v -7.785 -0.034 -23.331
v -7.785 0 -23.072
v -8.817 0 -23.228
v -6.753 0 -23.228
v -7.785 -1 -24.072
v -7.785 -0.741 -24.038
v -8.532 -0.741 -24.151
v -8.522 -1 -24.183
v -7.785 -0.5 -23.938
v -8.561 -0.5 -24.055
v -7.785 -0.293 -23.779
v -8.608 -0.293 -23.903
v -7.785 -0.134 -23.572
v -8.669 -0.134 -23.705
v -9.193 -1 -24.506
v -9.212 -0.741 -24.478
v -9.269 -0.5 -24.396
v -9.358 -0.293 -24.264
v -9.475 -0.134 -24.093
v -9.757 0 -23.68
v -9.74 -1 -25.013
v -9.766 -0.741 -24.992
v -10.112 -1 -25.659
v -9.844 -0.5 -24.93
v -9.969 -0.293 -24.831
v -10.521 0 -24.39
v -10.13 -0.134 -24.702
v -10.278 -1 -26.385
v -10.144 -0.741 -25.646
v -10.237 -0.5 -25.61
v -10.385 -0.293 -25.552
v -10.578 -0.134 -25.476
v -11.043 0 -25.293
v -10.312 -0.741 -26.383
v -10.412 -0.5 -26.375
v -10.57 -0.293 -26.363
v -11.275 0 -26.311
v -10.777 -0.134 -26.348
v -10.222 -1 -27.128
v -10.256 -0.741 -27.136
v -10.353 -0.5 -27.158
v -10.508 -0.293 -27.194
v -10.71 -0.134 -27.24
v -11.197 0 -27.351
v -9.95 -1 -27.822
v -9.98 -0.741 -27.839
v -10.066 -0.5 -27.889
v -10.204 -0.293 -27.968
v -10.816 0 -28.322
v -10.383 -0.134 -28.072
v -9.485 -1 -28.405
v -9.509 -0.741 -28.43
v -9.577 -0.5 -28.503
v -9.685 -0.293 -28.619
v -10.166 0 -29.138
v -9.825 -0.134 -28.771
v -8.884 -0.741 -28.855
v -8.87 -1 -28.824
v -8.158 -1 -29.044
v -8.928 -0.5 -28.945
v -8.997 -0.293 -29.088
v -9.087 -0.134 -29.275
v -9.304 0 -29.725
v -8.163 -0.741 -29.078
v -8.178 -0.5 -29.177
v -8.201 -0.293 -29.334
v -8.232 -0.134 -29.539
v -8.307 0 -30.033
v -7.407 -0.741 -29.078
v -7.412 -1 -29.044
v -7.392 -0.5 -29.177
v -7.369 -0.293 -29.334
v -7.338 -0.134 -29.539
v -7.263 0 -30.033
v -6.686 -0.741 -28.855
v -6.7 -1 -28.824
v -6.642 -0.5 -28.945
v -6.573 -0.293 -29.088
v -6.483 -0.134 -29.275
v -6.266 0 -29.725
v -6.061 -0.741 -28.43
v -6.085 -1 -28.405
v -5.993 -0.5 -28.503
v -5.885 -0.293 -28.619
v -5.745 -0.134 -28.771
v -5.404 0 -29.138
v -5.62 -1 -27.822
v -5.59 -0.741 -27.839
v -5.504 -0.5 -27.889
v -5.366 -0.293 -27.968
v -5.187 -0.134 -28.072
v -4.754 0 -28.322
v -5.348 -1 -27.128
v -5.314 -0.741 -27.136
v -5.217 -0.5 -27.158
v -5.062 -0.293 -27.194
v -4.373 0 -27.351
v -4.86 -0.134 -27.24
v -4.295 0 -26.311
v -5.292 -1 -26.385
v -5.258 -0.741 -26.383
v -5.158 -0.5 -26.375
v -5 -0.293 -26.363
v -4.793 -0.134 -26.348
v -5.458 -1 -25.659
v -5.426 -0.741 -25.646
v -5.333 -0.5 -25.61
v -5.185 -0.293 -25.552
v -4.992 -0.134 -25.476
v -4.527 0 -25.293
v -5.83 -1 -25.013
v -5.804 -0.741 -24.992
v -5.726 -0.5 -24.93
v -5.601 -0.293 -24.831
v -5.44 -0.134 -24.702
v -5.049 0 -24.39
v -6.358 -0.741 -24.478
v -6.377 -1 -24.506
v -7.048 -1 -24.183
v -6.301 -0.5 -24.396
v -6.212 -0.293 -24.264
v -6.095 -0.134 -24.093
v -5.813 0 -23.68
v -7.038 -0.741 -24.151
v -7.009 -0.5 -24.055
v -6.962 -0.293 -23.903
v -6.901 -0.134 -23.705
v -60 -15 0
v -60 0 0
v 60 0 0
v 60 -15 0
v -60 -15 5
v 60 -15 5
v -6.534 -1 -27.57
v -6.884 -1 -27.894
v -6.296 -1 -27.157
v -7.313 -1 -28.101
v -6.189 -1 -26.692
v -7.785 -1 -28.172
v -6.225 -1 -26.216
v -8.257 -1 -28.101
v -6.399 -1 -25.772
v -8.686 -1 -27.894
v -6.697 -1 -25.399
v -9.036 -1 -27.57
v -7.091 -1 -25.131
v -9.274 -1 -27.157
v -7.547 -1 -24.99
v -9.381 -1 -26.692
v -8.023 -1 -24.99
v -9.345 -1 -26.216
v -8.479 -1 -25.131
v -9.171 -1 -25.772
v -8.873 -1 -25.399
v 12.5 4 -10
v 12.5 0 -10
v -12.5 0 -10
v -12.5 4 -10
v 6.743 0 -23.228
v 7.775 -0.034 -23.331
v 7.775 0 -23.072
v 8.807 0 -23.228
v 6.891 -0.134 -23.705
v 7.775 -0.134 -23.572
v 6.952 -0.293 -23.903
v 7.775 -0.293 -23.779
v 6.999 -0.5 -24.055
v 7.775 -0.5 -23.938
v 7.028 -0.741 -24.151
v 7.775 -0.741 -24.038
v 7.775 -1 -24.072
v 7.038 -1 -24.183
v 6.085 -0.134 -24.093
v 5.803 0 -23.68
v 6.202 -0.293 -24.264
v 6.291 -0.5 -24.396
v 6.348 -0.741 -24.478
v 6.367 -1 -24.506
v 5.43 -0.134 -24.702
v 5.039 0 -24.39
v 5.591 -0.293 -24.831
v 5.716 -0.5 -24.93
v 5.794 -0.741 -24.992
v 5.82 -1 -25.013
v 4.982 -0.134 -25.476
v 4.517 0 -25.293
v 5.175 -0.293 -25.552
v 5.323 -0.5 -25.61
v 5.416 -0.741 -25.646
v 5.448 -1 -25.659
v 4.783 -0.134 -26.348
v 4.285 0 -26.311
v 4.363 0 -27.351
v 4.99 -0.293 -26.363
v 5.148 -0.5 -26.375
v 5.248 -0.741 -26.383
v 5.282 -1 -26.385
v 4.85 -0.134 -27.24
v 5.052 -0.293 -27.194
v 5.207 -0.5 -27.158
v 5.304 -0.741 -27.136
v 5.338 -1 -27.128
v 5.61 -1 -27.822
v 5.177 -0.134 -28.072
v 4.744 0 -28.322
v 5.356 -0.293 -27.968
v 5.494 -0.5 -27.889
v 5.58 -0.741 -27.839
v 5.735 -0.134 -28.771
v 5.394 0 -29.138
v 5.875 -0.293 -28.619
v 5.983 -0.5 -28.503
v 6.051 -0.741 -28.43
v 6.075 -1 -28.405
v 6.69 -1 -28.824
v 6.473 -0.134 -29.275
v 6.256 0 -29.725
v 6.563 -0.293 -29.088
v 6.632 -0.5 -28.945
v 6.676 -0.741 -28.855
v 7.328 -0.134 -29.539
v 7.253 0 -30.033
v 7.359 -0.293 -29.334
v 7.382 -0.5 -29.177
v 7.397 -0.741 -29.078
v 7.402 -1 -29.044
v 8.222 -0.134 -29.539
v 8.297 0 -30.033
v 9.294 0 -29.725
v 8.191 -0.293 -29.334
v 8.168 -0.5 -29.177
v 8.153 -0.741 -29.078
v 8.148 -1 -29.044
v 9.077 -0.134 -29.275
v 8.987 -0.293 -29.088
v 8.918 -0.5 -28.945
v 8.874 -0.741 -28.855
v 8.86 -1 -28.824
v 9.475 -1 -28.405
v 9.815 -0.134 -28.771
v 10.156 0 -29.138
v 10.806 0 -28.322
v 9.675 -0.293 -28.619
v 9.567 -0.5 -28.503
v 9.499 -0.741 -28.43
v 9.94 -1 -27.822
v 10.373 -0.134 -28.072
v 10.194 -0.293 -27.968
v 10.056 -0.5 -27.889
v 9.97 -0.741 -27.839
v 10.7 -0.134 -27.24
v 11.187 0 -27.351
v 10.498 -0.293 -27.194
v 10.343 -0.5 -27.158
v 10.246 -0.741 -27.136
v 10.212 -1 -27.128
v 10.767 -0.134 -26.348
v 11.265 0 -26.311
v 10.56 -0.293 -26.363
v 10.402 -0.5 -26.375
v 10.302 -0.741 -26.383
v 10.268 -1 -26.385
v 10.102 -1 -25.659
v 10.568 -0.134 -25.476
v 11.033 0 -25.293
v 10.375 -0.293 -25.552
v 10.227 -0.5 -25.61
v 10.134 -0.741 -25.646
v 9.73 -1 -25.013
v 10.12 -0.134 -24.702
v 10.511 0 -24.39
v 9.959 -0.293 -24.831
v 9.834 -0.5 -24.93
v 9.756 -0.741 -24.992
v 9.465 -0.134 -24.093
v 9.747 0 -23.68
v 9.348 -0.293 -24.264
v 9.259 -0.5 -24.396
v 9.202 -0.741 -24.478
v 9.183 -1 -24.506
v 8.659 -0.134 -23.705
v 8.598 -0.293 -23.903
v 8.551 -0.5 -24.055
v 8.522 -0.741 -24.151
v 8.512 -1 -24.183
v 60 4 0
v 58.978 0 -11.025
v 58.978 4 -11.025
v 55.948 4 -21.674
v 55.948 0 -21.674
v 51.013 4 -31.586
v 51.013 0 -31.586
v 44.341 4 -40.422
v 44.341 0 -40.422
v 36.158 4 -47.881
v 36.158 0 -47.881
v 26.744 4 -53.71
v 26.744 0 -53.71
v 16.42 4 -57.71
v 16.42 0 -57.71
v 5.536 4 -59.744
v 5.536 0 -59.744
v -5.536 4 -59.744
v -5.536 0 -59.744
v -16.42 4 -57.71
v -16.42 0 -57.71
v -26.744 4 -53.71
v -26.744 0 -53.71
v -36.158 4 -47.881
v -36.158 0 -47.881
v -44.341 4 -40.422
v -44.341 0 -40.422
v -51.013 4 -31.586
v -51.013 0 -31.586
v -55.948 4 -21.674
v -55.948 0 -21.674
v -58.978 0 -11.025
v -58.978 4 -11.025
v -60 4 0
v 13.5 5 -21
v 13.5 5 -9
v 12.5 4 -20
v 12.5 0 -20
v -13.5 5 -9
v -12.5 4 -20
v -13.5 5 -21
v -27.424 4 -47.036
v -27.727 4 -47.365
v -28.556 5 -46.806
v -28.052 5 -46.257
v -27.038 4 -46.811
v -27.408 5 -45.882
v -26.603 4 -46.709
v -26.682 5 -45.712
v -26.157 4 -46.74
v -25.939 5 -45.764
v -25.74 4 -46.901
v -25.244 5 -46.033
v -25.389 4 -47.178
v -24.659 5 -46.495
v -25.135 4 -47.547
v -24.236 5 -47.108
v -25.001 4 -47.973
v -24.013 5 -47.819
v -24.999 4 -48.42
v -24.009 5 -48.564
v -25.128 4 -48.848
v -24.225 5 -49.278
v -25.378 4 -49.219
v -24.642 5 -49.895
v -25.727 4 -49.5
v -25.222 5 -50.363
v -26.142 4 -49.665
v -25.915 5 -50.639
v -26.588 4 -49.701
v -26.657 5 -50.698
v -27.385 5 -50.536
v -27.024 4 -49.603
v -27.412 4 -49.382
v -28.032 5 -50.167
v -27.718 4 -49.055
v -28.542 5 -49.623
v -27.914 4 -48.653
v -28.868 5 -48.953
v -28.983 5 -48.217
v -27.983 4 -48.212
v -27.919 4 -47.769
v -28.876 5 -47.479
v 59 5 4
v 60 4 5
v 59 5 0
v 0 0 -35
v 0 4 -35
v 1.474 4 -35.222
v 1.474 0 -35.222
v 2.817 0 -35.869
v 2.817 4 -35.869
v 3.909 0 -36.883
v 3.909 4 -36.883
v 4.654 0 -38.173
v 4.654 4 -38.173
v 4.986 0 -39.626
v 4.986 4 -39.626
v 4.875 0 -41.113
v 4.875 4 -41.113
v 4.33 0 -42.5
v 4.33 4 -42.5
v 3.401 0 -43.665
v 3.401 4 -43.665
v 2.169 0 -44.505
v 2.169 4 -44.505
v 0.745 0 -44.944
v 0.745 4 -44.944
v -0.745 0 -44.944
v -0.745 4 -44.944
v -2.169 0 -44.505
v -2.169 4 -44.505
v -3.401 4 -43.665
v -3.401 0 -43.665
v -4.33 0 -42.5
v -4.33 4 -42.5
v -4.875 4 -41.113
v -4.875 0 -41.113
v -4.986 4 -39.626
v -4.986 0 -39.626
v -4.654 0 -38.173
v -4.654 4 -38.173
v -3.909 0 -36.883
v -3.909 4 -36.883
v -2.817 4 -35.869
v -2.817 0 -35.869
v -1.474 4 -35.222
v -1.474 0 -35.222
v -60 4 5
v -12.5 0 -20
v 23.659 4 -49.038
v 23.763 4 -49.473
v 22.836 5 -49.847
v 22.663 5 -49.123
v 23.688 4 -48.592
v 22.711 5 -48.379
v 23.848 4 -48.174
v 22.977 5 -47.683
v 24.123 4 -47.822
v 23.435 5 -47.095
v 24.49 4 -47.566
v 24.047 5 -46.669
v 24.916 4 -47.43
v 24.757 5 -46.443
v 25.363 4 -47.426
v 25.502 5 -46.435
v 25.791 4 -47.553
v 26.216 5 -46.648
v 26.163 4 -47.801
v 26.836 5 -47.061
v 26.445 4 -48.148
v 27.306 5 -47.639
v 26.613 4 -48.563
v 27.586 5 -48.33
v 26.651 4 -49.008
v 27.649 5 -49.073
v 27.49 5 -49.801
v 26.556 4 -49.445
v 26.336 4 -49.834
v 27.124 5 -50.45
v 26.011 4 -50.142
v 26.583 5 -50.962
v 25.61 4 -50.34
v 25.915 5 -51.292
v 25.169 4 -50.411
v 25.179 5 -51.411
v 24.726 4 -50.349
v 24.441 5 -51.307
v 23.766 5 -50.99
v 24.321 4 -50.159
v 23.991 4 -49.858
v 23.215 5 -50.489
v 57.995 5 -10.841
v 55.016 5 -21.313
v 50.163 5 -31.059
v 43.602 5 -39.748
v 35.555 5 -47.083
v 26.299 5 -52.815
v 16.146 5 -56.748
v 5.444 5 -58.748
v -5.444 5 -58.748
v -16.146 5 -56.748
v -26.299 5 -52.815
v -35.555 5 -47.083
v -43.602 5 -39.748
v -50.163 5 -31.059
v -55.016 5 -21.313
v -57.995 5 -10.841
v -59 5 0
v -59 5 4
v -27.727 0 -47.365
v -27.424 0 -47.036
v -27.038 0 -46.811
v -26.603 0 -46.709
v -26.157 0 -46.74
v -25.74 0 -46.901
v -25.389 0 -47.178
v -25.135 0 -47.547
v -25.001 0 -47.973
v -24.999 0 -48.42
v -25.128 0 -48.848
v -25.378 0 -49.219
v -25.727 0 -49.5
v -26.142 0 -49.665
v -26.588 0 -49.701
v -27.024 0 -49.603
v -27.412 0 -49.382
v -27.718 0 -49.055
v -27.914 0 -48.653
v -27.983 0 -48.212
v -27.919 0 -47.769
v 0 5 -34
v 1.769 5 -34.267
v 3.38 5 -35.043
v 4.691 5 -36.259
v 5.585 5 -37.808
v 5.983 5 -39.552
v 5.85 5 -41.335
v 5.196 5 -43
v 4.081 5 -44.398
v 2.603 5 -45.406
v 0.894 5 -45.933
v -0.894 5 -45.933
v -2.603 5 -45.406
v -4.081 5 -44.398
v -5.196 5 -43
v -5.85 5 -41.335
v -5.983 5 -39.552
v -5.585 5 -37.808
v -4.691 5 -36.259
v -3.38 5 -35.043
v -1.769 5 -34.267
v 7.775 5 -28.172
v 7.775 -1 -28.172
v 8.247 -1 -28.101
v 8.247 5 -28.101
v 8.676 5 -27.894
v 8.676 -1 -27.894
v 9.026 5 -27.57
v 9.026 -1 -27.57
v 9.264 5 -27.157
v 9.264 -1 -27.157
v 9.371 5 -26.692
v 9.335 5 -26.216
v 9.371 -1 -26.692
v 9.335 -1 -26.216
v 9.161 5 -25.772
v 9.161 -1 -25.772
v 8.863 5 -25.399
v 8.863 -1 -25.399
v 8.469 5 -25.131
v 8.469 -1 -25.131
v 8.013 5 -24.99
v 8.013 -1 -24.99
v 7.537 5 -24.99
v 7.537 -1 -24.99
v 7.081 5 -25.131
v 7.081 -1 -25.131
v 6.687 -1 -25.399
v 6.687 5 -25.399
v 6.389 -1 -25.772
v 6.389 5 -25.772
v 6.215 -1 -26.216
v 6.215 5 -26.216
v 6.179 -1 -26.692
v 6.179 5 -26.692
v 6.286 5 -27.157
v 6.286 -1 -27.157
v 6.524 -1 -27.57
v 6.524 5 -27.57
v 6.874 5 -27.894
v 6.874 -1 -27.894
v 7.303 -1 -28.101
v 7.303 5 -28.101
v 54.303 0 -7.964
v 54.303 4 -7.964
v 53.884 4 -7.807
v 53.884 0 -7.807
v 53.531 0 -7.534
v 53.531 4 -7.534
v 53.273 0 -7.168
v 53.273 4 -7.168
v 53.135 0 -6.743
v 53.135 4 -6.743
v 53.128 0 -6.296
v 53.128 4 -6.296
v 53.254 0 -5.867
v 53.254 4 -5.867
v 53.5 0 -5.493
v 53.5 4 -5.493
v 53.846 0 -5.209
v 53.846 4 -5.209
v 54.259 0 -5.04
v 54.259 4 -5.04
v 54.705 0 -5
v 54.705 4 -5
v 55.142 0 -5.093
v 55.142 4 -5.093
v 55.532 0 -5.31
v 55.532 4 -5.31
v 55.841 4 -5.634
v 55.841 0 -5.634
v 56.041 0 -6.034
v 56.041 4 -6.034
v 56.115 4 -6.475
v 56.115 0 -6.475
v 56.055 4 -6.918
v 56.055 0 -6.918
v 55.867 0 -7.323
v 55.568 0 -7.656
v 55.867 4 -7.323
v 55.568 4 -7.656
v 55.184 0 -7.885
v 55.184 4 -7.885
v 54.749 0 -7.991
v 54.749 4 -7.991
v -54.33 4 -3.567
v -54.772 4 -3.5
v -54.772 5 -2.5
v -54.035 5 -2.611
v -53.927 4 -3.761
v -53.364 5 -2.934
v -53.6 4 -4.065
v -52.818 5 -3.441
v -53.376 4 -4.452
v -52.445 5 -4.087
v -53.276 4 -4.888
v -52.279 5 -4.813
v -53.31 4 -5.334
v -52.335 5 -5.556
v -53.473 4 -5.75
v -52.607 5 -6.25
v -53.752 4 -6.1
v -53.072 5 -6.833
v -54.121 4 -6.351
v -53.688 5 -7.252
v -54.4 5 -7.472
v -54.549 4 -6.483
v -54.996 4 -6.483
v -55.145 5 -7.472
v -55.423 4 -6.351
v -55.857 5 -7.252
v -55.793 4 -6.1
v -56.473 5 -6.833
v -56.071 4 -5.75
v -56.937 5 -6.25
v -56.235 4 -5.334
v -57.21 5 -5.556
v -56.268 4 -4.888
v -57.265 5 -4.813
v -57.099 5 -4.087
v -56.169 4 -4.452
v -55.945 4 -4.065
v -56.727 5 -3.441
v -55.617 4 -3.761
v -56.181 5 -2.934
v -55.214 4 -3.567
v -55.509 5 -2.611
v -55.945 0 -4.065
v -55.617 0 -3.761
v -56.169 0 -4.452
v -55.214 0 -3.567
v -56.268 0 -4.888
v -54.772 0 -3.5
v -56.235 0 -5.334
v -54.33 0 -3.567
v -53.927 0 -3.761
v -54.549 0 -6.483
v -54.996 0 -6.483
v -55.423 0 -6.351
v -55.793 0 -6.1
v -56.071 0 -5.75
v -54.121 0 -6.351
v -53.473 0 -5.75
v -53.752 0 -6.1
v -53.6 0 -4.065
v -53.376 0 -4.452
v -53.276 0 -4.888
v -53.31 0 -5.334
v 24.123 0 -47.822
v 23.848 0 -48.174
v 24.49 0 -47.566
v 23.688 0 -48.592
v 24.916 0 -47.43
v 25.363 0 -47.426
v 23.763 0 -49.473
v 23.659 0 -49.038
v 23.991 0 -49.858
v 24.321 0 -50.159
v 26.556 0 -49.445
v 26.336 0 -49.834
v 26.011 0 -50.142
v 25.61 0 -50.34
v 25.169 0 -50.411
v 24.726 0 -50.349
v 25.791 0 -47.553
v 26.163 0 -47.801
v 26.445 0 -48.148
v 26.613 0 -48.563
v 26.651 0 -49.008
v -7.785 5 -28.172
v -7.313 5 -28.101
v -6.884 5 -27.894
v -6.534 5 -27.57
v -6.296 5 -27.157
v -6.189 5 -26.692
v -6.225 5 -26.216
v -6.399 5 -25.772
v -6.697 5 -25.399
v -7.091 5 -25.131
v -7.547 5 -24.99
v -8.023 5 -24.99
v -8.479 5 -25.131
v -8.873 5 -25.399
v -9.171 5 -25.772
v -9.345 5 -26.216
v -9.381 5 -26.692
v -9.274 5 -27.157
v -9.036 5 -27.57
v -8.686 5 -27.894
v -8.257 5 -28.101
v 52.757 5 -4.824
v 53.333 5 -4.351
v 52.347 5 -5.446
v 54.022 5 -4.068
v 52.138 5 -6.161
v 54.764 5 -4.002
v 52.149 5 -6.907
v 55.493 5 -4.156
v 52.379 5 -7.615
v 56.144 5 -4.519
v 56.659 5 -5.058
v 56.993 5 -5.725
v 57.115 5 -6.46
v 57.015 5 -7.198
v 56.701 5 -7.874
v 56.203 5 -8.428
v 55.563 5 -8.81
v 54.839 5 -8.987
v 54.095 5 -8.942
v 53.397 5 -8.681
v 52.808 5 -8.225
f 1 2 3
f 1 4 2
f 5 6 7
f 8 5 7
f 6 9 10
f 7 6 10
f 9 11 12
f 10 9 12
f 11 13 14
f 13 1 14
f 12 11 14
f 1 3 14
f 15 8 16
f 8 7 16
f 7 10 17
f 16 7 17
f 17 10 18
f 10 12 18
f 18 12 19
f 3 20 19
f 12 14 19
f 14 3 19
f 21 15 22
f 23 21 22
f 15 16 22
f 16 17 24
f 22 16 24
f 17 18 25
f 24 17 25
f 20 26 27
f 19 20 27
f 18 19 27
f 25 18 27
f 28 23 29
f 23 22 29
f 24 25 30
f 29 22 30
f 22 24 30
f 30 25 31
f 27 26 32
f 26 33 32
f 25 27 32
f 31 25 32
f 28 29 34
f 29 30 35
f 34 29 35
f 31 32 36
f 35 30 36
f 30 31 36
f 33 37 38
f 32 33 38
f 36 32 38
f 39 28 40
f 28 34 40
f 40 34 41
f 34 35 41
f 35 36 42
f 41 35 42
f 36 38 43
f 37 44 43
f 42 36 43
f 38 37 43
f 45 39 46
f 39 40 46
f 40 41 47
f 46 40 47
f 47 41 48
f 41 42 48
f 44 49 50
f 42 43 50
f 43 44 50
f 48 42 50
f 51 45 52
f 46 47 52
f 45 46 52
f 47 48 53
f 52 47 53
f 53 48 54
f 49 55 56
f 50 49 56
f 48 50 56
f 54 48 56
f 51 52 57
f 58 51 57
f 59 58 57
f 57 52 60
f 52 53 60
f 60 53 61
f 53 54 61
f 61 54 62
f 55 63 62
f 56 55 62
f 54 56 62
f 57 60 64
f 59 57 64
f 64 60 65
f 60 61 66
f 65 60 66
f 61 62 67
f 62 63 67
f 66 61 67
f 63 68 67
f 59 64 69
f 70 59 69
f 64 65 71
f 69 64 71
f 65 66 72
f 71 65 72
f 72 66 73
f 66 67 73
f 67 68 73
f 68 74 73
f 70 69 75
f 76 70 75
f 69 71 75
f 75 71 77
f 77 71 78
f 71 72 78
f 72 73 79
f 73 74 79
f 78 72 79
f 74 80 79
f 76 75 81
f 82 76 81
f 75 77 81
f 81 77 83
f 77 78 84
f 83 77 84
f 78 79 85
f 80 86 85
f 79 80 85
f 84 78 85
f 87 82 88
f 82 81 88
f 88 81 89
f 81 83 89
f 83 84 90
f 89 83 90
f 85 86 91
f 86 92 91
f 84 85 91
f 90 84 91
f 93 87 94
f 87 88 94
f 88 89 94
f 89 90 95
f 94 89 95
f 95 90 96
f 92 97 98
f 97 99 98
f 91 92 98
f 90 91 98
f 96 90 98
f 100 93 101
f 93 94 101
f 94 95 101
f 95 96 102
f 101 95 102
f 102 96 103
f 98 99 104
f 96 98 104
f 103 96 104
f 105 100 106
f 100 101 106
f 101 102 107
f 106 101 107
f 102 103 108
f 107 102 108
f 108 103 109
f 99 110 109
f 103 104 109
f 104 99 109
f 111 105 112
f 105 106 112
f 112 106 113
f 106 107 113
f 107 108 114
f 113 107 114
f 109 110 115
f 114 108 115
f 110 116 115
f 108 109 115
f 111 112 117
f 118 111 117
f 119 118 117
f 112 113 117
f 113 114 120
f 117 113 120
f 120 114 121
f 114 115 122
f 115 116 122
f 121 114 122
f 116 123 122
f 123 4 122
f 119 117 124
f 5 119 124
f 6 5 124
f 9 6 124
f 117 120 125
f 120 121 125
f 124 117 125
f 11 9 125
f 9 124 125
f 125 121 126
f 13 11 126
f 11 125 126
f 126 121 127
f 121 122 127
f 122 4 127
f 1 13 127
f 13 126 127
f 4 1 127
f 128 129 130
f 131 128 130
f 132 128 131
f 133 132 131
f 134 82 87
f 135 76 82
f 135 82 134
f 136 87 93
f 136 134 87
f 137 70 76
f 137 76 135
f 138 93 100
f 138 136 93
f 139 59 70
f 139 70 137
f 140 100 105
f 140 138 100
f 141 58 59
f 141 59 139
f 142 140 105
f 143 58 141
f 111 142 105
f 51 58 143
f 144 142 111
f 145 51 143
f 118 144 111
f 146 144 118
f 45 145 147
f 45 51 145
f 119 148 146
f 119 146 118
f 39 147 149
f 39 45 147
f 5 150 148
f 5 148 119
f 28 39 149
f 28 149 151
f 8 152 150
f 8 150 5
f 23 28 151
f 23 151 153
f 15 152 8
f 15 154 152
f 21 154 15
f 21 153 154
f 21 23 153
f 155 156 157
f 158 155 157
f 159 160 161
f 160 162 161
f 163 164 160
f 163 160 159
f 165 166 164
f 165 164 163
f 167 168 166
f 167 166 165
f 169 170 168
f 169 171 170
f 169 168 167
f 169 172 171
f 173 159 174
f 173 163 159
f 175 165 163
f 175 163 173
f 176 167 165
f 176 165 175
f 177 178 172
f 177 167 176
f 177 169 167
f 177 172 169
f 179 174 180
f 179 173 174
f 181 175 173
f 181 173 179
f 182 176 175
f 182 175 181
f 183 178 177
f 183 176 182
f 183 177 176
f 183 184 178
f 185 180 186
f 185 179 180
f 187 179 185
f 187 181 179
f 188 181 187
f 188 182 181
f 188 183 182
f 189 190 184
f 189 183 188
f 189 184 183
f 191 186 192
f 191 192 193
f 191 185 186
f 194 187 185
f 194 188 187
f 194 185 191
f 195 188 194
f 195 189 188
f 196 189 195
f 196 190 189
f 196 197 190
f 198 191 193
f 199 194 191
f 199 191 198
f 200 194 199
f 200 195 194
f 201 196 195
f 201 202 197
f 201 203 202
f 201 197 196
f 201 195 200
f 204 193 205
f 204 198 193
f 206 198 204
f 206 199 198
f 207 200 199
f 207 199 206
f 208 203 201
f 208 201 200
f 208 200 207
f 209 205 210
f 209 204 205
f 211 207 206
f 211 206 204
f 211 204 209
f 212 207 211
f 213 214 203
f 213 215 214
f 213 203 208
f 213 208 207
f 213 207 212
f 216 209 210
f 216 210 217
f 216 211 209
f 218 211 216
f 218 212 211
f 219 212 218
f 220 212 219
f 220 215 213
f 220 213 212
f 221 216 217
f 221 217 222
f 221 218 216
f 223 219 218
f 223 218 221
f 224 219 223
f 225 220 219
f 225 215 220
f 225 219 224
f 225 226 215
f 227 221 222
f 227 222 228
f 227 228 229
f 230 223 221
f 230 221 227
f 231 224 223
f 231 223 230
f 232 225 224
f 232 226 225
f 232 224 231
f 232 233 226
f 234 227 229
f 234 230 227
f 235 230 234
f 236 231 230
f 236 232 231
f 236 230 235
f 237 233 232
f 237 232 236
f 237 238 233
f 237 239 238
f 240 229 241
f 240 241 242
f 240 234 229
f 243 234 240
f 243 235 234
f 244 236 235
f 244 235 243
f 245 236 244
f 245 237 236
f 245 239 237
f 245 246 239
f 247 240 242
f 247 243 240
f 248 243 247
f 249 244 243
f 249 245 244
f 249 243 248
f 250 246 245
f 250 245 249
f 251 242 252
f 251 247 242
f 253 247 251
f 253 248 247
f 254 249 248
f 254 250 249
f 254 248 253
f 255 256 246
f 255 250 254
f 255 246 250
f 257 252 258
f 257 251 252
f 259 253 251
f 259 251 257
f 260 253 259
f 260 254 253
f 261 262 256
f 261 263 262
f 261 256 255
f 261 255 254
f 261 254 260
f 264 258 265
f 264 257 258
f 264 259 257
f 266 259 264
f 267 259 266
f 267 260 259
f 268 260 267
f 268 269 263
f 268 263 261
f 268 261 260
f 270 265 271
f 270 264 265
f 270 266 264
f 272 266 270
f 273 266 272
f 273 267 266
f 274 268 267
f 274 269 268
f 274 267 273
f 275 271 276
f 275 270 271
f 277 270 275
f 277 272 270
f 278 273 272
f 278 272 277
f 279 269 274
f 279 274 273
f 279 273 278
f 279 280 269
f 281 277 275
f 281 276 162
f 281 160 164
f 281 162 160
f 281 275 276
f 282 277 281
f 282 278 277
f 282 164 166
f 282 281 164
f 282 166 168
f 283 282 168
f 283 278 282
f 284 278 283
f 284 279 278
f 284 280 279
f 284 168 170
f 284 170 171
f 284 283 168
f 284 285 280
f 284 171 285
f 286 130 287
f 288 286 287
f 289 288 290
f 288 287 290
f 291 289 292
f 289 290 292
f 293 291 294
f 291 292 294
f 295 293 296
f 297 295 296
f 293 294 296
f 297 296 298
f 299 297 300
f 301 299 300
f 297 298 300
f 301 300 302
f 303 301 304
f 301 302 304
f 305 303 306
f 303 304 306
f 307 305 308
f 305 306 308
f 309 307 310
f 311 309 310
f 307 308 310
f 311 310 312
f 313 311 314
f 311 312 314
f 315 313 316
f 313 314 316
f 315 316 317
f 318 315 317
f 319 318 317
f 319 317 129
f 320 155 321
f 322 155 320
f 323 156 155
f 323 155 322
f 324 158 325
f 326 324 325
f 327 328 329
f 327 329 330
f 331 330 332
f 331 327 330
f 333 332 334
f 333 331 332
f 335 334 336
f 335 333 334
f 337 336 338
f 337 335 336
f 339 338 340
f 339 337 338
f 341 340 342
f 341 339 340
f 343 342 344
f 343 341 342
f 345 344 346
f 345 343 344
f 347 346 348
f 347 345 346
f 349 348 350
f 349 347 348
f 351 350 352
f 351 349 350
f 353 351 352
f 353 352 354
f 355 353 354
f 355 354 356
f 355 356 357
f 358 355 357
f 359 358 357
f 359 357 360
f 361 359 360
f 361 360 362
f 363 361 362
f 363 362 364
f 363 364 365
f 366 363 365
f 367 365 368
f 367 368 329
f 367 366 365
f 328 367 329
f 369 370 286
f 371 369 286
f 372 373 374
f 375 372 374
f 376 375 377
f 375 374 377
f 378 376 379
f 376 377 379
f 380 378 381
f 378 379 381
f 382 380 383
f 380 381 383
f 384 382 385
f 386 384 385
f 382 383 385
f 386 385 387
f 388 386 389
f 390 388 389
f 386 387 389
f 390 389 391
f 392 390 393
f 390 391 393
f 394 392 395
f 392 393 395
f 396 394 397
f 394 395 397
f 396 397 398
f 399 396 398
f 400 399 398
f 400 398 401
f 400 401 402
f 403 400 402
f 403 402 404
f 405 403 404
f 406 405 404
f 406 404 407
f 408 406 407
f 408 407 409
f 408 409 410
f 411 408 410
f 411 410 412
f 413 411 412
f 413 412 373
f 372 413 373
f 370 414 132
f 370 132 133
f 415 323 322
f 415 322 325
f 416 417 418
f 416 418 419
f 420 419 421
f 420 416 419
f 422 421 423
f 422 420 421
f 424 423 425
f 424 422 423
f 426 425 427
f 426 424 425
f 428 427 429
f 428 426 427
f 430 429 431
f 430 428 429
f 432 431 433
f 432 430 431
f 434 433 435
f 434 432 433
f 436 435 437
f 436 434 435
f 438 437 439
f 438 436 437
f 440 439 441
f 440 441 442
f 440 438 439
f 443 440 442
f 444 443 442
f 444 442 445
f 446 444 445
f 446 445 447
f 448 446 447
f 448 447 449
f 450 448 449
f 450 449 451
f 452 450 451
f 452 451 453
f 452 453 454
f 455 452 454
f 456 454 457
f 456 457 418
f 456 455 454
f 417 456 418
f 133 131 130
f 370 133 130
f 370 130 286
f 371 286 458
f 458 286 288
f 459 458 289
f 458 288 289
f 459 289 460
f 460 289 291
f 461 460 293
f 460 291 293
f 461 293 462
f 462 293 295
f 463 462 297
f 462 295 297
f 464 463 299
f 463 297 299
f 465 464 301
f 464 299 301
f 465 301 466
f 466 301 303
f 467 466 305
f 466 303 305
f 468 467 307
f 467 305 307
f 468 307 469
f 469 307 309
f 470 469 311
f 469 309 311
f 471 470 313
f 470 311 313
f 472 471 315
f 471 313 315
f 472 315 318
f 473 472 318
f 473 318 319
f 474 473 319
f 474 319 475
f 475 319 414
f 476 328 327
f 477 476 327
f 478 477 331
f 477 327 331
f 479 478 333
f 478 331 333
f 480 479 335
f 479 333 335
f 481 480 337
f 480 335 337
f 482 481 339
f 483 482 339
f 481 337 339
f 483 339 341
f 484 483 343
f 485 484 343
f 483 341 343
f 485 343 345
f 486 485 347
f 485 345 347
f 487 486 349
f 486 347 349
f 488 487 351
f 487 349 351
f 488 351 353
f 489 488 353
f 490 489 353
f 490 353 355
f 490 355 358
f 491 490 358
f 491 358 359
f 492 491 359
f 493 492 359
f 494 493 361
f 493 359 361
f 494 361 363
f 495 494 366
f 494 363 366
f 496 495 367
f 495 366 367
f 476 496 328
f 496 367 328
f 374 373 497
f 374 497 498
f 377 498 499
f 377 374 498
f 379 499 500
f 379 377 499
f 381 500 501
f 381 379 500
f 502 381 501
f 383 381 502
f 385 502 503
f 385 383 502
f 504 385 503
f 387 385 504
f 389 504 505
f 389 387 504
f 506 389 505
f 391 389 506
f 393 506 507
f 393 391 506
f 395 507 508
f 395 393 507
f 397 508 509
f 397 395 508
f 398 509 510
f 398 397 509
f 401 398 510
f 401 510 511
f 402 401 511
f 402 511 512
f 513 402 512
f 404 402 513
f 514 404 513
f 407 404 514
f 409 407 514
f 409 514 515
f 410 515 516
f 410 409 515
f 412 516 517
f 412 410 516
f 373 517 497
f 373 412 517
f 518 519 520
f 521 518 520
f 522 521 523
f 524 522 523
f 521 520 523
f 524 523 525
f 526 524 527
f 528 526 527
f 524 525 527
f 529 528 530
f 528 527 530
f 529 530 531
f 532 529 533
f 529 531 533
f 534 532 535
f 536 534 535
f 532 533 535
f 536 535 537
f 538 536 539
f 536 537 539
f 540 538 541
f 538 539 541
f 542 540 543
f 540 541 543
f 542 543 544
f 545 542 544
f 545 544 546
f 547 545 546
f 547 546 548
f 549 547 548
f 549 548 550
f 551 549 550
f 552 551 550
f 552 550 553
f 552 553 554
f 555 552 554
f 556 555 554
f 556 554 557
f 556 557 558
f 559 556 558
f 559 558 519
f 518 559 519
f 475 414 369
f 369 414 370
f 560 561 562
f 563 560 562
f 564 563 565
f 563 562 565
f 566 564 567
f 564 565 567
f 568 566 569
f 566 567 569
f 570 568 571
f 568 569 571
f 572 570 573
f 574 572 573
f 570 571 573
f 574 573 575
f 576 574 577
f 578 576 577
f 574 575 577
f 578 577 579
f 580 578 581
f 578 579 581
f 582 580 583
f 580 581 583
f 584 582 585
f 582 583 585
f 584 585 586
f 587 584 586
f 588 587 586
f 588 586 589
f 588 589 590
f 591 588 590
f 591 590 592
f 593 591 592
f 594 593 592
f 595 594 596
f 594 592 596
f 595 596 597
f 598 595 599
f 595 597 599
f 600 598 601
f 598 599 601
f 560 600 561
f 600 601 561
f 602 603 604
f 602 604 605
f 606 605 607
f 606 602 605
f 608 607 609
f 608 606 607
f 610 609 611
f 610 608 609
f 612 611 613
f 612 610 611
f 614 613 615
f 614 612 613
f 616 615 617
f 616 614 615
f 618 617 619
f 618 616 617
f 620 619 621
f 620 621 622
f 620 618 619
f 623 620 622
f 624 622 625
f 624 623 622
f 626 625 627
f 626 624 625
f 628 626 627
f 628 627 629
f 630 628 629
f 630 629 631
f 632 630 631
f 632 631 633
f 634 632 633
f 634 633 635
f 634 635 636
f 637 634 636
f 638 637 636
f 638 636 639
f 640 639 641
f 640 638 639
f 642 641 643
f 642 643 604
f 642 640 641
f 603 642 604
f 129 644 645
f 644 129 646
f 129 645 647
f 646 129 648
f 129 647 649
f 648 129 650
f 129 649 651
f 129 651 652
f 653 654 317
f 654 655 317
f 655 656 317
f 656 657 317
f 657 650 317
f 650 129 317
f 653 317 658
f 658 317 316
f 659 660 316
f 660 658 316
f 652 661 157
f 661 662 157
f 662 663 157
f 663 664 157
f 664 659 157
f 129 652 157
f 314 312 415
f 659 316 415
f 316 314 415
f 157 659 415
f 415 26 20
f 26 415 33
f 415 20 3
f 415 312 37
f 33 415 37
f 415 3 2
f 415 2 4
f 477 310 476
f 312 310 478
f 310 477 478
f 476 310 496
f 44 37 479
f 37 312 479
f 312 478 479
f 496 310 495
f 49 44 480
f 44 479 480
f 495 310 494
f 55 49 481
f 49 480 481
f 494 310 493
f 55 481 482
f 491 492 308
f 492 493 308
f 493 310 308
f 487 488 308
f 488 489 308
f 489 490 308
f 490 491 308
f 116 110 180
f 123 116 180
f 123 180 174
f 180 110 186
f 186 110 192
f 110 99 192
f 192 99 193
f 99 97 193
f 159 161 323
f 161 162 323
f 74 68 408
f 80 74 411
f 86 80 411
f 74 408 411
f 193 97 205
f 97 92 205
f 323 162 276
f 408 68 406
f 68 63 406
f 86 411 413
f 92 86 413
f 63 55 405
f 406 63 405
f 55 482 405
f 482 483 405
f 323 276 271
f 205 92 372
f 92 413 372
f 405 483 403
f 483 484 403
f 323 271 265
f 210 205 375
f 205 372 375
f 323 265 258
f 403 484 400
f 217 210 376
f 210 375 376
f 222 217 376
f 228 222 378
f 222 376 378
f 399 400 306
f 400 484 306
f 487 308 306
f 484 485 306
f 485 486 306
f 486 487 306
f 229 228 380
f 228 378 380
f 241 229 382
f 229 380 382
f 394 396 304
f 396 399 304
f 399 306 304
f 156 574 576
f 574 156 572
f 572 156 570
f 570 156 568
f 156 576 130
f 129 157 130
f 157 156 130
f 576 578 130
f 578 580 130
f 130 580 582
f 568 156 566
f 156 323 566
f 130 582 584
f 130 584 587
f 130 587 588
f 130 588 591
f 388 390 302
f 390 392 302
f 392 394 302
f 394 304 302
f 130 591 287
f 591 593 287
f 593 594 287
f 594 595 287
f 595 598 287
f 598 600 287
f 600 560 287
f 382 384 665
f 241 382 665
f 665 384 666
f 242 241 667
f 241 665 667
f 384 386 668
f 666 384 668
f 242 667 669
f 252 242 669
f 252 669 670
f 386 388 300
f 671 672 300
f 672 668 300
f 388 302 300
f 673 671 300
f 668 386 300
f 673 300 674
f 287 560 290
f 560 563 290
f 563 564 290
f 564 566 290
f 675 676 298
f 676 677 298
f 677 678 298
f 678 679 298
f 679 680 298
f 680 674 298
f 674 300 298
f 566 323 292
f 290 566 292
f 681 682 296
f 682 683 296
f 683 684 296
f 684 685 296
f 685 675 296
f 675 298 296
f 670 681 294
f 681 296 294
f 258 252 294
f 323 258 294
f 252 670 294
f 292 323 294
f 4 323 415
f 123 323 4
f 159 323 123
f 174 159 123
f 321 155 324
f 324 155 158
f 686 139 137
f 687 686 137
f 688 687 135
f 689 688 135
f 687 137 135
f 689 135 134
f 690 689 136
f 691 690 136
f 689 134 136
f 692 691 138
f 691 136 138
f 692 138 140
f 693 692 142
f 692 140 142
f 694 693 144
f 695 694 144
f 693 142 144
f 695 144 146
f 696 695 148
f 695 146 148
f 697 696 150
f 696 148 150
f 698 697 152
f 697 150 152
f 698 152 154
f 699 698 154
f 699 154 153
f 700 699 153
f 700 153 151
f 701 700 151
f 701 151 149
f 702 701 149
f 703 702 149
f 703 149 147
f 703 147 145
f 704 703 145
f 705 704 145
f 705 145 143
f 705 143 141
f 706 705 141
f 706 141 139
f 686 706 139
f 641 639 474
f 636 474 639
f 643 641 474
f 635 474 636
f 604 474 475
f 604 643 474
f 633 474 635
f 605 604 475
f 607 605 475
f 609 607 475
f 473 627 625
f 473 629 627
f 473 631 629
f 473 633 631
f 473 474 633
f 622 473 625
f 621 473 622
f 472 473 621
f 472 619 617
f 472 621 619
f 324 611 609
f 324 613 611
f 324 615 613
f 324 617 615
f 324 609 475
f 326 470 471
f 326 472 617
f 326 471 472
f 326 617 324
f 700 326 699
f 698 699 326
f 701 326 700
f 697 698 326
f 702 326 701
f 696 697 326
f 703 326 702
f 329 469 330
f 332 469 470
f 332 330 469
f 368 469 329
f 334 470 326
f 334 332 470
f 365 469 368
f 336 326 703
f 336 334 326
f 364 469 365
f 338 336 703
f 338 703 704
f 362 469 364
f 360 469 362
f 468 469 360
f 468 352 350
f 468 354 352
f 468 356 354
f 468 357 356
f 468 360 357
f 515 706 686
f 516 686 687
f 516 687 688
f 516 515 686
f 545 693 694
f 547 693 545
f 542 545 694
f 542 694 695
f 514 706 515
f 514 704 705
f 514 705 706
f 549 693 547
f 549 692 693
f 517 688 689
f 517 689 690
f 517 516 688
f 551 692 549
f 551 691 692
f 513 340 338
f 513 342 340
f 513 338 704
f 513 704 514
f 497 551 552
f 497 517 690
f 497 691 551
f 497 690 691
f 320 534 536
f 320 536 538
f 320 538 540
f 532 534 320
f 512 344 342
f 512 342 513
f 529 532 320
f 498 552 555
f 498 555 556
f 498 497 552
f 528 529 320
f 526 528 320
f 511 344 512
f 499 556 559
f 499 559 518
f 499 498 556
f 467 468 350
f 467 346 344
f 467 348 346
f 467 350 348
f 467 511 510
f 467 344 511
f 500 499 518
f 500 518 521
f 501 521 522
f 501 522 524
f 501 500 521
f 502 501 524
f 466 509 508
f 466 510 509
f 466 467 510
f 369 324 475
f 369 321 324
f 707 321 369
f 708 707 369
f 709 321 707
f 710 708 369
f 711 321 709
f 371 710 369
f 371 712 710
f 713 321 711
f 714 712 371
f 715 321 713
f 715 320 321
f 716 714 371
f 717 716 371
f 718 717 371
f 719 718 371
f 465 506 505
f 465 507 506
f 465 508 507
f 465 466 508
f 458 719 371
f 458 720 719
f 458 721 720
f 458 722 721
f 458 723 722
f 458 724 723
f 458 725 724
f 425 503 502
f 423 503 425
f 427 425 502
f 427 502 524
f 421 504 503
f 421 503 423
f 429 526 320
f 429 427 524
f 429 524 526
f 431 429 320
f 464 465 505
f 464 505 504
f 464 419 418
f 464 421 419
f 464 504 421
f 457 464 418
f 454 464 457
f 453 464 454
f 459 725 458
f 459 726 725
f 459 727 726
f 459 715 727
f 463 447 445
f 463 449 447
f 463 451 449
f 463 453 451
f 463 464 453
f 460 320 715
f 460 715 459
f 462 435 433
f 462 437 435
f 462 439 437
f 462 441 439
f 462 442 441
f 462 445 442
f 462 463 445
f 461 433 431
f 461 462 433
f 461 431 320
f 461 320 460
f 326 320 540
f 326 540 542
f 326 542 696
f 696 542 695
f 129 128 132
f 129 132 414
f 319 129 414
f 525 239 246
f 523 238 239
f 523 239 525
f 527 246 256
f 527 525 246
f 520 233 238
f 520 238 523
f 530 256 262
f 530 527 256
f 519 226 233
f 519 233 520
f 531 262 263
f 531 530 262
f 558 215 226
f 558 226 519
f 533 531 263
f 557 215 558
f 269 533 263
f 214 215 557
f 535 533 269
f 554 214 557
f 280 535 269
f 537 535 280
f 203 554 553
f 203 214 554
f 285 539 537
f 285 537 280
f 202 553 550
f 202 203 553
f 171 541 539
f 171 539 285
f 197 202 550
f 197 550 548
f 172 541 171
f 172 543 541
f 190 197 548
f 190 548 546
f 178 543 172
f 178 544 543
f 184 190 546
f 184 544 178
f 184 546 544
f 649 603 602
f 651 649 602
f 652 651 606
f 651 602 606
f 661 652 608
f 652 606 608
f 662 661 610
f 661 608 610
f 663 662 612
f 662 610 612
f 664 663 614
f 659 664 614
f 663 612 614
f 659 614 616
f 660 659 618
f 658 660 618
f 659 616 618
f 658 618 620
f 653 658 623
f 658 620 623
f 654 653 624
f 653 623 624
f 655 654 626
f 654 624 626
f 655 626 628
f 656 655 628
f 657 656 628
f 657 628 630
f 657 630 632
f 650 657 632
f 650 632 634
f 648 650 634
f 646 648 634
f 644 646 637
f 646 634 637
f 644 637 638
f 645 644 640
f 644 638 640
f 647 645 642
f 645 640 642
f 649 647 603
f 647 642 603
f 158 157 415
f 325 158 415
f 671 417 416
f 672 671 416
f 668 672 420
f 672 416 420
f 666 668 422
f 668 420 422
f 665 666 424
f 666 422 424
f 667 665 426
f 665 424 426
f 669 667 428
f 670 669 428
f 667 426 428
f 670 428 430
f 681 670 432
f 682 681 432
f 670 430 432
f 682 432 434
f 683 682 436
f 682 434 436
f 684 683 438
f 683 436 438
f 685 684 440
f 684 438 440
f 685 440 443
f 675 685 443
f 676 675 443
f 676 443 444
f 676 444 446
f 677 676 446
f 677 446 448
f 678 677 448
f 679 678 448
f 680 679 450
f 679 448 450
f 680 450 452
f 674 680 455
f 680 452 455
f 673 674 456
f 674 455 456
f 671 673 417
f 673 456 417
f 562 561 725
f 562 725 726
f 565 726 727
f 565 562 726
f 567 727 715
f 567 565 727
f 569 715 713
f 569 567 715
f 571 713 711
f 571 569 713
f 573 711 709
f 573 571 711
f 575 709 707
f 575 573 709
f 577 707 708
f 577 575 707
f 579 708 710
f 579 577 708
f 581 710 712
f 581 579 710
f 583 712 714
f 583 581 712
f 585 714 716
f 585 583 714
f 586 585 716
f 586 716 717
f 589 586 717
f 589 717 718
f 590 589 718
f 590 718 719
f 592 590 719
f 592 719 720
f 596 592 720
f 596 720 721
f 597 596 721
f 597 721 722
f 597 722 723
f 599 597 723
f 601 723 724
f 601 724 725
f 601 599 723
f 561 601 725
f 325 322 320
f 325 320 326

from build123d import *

# Parameters (mm, degrees)
BOSS_EXTRUDE1_DEPTH = 5
SKETCH2_R           = 1.5
CUT_EXTRUDE1_DEPTH  = 5
CIRPATTERN1_COUNT   = 4
CIRPATTERN1_ANGLE   = 168
SKETCH8_W           = 25
SKETCH8_H           = 10
CUT_EXTRUDE3_DEPTH  = 5
SKETCH9_W           = 120
SKETCH9_H           = 20
BOSS_EXTRUDE5_DEPTH = 5
SKETCH10_R          = 5
CUT_EXTRUDE4_DEPTH  = 10
CHAMFER1_SIZE       = 1
CHAMFER2_SIZE       = 1
SKETCH5_R           = 1.6
CUT_EXTRUDE5_DEPTH  = 10
BOSS_EXTRUDE6_START = 1
SKETCH11_R          = 2.5
SKETCH11_R_2        = 1.6
BOSS_EXTRUDE6_DEPTH = 1
FILLET5_R           = 1


with BuildPart() as part:
    # Sketch1 → Boss-Extrude1 (new body)
    with BuildSketch(Plane(origin=(0, 0, 0), x_dir=(1, 0, 0), z_dir=(0, 1, 0))):
        with BuildLine():
            Line((-60, 0), (-25.75, 0))
            Line((-25.75, 0), (25.75, 0))
            Line((25.75, 0), (60, 0))
            ThreePointArc((60, 0), (0, 60), (-60, 0))
        make_face()
    extrude(amount=BOSS_EXTRUDE1_DEPTH)

    # Sketch2 → Cut-Extrude1 (cut)
    with BuildSketch(Plane(origin=(0, 5, 0), x_dir=(1, 0, 0), z_dir=(0, 1, 0))):
        with Locations(Location((-54.772255751, 5, 0), (0, 0, 270))):
            Circle(SKETCH2_R)
    cut_extrude1 = extrude(amount=-CUT_EXTRUDE1_DEPTH, mode=Mode.SUBTRACT)

    # CirPattern1: Cut-Extrude1 ×4 about axis
    cirpattern1_axis = Axis((0, 0, 0), (0, -1, 0))
    for i in range(1, CIRPATTERN1_COUNT):
        add(cut_extrude1.rotate(cirpattern1_axis, i * CIRPATTERN1_ANGLE / (CIRPATTERN1_COUNT - 1)), mode=Mode.SUBTRACT)

    # Sketch8 → Cut-Extrude3 (cut, symmetric)
    with BuildSketch(Plane(origin=(0, 0, 0), x_dir=(-1, 0, 0), z_dir=(0, -1, 0))):
        with Locations((0, 15)):
            Rectangle(SKETCH8_W, SKETCH8_H)
    extrude(amount=CUT_EXTRUDE3_DEPTH, both=True, mode=Mode.SUBTRACT)

    # Sketch9 → Boss-Extrude5 (add)
    with BuildSketch(Plane.XY):
        with Locations((0, -5)):
            Rectangle(SKETCH9_W, SKETCH9_H)
    extrude(amount=BOSS_EXTRUDE5_DEPTH)

    # Sketch10 → Cut-Extrude4 (cut)
    with BuildSketch(Plane(origin=(0, 5, 0), x_dir=(1, 0, 0), z_dir=(0, 1, 0))):
        with Locations(Location((0, 40, 0), (0, 0, 270))):
            Circle(SKETCH10_R)
    extrude(amount=-CUT_EXTRUDE4_DEPTH, mode=Mode.SUBTRACT)

    # Chamfer1
    chamfer1_edges = [part.edges().sort_by_distance(p)[0] for p in [
        (-54.772255751, 5, -6.5),
        (-25.239512501, 5, -49.043011823),
        (26.544743195, 5, -48.349008353),
        (54.926776539, 5, -5.029832898),
        (-12.5, 5, -15),
        (0, 5, -10),
        (12.5, 5, -15),
        (0, 5, -20),
        (0, 5, -45),
    ]]
    chamfer(chamfer1_edges, length=CHAMFER1_SIZE)

    # Chamfer2
    chamfer2_edges = [part.edges().sort_by_distance(p)[0] for p in [
        (0, 5, -60),
        (-60, 5, 2.5),
        (60, 5, 2.5),
        (0, 5, 5),
    ]]
    chamfer(chamfer2_edges, length=CHAMFER2_SIZE)

    # Sketch5 → Cut-Extrude5 (cut)
    with BuildSketch(Plane.XZ):
        with Locations(Location((-7.785, -26.572067281, 0), (0, 0, 270))):
            Circle(SKETCH5_R)
        with Locations(Location((7.775, -26.572067281, 0), (0, 0, 270))):
            Circle(SKETCH5_R)
    extrude(amount=-CUT_EXTRUDE5_DEPTH, mode=Mode.SUBTRACT)

    # Sketch11 → Boss-Extrude6 (add)
    # profile 1 of 2: a face of its own
    with BuildSketch(Plane.XZ.offset(BOSS_EXTRUDE6_START)):
        with Locations(Location((-7.785, -26.572067281, 0), (0, 0, 90))):
            Circle(SKETCH11_R)
        with Locations(Location((-7.785, -26.572067281, 0), (0, 0, 270))):
            Circle(SKETCH11_R_2, mode=Mode.SUBTRACT)
    # profile 2 of 2: a face of its own
    with BuildSketch(Plane.XZ.offset(BOSS_EXTRUDE6_START)):
        with Locations(Location((7.775, -26.572067281, 0), (0, 0, 90))):
            Circle(SKETCH11_R)
        with Locations(Location((7.775, -26.572067281, 0), (0, 0, 270))):
            Circle(SKETCH11_R_2, mode=Mode.SUBTRACT)
    extrude(amount=-BOSS_EXTRUDE6_DEPTH)

    # Fillet5
    fillet5_edges = [part.edges().sort_by_distance(p)[0] for p in [
        (-7.785, 0, -29.072067281),
        (7.775, 0, -29.072067281),
    ]]
    fillet(fillet5_edges, radius=FILLET5_R - 0.0001)  # a hair under: the kernel refuses the full size


solid = part.part
